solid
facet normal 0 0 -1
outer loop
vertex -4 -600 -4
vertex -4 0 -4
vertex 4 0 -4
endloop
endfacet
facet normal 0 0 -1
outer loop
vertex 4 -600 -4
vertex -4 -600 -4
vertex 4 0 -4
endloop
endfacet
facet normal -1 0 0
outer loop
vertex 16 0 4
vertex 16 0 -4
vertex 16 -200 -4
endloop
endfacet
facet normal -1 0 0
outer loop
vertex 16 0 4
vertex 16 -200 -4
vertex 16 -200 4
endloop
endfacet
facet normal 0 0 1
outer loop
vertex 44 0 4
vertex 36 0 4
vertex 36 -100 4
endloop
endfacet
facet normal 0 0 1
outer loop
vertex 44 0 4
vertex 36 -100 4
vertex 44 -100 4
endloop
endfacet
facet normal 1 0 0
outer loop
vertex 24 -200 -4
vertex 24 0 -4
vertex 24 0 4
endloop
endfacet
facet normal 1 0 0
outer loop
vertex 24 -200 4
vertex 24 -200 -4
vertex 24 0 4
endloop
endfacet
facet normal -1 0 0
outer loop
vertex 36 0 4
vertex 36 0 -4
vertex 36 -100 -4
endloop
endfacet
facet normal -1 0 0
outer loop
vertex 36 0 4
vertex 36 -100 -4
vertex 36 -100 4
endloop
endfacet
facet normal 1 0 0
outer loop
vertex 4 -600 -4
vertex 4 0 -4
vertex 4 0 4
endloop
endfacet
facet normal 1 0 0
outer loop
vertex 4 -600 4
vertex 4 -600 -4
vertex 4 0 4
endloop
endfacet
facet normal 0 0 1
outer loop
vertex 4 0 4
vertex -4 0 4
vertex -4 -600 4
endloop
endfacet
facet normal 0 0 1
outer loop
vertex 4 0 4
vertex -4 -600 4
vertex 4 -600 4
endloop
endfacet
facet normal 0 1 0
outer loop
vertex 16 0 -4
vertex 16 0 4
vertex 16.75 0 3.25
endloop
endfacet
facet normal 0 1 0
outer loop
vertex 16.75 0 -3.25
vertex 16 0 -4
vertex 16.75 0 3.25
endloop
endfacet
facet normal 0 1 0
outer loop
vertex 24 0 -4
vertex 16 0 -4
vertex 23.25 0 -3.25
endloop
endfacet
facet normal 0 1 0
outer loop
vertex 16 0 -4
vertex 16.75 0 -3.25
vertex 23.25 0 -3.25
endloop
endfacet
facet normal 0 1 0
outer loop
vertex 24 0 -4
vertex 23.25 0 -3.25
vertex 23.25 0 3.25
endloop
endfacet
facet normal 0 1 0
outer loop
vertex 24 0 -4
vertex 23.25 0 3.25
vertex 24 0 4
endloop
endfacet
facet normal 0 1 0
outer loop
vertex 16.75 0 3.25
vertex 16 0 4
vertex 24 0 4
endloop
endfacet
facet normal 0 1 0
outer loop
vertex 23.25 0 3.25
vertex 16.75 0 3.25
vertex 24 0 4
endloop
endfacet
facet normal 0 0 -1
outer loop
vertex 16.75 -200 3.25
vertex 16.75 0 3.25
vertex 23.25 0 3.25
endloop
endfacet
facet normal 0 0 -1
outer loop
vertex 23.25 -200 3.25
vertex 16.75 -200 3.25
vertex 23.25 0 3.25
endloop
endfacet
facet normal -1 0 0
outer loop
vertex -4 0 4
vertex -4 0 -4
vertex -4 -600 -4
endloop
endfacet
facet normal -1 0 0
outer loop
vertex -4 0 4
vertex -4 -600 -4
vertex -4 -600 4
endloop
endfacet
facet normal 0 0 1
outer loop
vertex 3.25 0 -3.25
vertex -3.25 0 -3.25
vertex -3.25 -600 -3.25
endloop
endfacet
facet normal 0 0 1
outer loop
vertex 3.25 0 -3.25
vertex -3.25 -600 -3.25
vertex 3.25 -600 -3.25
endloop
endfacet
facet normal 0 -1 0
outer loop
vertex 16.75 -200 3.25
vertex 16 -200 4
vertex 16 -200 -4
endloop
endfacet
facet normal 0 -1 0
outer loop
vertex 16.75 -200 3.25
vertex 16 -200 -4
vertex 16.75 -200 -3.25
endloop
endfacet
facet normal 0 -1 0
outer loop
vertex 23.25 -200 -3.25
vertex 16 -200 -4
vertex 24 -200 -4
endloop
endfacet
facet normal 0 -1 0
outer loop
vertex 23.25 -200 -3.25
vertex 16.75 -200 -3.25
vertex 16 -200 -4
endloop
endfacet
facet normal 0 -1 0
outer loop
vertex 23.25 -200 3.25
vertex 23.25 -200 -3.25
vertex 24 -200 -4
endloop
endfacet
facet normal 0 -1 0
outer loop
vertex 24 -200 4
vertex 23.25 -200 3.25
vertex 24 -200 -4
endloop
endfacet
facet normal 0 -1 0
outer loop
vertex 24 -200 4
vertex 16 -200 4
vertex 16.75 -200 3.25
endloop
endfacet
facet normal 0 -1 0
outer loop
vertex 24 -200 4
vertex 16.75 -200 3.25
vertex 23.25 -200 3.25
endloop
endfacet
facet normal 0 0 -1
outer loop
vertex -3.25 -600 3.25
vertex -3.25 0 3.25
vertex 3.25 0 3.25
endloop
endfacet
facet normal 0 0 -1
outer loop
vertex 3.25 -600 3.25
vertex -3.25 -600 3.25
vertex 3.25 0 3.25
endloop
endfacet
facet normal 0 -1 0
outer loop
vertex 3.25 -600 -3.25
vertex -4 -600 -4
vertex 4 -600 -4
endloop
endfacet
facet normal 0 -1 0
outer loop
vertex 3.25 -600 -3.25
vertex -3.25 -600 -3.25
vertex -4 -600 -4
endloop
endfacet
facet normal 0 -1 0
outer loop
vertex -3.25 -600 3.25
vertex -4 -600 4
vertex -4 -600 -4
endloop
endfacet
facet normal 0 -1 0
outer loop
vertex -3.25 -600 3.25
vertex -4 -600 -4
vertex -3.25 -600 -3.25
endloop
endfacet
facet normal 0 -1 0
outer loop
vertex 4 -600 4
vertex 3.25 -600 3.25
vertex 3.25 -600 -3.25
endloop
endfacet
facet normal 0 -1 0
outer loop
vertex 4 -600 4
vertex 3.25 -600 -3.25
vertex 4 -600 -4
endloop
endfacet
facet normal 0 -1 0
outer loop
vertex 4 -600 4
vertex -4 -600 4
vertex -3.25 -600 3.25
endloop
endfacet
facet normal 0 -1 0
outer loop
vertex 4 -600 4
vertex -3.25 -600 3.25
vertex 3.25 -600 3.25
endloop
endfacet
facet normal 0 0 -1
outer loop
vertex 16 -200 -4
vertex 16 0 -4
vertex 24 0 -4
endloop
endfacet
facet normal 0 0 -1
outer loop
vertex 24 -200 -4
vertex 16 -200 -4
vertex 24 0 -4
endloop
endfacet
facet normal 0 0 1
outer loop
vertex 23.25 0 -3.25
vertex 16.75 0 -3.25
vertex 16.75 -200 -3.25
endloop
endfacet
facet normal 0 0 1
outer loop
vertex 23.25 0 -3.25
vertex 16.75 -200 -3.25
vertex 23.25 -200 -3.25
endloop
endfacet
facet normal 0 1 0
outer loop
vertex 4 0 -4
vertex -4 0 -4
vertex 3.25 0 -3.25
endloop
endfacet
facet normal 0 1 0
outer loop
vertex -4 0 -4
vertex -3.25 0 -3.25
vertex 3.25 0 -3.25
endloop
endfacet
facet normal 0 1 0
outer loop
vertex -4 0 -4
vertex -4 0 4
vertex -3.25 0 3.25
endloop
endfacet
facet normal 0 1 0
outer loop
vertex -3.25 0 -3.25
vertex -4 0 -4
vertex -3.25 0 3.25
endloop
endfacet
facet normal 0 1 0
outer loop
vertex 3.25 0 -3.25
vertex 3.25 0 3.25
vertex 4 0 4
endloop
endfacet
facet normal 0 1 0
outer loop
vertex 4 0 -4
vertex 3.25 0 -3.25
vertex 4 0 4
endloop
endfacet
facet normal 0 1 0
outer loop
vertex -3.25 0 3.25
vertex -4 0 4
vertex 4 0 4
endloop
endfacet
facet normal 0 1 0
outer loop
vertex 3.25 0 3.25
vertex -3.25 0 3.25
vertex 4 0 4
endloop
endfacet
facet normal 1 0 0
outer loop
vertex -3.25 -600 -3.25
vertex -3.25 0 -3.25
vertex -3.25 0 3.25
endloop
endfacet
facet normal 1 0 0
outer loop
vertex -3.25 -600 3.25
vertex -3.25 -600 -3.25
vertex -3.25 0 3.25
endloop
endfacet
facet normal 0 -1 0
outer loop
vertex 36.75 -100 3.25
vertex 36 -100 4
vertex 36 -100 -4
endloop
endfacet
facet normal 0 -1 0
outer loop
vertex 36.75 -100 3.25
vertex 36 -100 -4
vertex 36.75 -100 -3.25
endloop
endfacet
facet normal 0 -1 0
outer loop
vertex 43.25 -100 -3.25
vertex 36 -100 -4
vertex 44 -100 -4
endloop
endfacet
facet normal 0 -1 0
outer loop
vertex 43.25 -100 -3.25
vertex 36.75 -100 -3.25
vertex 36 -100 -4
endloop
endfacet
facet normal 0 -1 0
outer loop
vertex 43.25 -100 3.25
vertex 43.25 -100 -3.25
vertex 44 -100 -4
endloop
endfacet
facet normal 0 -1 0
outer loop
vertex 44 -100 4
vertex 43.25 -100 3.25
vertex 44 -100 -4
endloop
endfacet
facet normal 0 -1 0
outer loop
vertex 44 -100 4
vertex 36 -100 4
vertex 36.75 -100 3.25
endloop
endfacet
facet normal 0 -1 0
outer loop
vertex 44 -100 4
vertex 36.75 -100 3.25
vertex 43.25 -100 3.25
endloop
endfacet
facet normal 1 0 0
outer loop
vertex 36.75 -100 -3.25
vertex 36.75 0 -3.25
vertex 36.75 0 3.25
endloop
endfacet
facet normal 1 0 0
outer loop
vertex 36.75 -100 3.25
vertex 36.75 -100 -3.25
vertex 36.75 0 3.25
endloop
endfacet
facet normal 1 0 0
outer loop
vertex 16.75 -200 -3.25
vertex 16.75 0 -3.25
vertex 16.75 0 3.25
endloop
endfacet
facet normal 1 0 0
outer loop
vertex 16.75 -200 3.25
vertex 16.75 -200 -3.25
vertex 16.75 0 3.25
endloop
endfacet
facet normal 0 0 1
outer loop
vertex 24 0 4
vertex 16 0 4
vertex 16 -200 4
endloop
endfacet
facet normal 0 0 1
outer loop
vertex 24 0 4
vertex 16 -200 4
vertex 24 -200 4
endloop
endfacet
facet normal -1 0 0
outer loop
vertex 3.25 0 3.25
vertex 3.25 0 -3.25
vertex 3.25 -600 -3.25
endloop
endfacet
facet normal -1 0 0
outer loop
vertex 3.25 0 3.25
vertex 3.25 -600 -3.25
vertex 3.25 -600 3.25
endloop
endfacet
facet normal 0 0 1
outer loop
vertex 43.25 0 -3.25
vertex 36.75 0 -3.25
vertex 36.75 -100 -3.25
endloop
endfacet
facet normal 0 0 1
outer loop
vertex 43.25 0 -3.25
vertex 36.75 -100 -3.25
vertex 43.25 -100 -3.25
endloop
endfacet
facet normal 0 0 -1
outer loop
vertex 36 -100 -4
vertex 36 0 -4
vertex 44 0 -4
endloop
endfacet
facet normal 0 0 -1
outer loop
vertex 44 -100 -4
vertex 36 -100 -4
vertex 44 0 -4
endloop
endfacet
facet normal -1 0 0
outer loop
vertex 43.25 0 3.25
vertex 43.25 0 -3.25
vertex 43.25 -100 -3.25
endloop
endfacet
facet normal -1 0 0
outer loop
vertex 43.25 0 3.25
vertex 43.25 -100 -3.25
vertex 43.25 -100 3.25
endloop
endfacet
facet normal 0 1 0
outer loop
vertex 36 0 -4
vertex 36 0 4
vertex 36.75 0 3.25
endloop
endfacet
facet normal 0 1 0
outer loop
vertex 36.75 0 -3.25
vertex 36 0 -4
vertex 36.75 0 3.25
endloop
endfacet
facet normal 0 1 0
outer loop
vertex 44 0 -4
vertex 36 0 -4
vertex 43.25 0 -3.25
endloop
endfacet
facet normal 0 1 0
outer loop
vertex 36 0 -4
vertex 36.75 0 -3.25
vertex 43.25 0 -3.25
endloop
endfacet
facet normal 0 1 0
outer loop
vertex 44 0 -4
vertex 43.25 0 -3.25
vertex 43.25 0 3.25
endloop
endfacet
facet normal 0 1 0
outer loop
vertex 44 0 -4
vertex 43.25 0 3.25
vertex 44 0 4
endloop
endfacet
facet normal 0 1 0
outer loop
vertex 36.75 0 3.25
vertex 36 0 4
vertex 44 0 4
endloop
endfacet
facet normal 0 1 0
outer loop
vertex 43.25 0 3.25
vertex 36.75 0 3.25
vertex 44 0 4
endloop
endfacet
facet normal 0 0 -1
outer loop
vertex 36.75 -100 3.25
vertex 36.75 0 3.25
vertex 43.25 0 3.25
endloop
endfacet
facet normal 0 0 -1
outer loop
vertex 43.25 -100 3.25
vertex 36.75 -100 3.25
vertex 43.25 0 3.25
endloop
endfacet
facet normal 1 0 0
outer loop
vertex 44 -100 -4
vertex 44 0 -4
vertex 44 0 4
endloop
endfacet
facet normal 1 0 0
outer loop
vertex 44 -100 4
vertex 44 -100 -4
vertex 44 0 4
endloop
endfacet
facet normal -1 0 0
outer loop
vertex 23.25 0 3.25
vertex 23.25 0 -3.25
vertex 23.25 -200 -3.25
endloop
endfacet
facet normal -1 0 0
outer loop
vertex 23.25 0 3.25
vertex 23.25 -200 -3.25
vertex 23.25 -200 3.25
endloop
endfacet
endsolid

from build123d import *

# Parameters (mm, degrees)
F0_W     = 8
F0_H     = 8
F0_W_2   = 6.5
F0_H_2   = 6.5
F1_DEPTH = 600
F2_W     = 8
F2_H     = 8
F2_W_2   = 6.5
F2_H_2   = 6.5
F3_DEPTH = 200
F4_W     = 8
F4_H     = 8
F4_W_2   = 6.5
F4_H_2   = 6.5
F5_DEPTH = 100


with BuildPart() as f1:
    # F0 (on Front) → F1 (new body)
    with BuildSketch(Plane.XZ):
        Rectangle(F0_W, F0_H)
        Rectangle(F0_W_2, F0_H_2, mode=Mode.SUBTRACT)
    extrude(amount=F1_DEPTH)


with BuildPart() as f3:
    # F2 (on Front) → F3 (new body)
    with BuildSketch(Plane.XZ):
        with Locations((20, 0)):
            Rectangle(F2_W, F2_H)
        with Locations((20, 0)):
            Rectangle(F2_W_2, F2_H_2, mode=Mode.SUBTRACT)
    extrude(amount=F3_DEPTH)


with BuildPart() as f5:
    # F4 (on Front) → F5 (new body)
    with BuildSketch(Plane.XZ):
        with Locations((40, 0)):
            Rectangle(F4_W, F4_H)
        with Locations((40, 0)):
            Rectangle(F4_W_2, F4_H_2, mode=Mode.SUBTRACT)
    extrude(amount=F5_DEPTH)


solid = Compound([f1.part, f3.part, f5.part])
